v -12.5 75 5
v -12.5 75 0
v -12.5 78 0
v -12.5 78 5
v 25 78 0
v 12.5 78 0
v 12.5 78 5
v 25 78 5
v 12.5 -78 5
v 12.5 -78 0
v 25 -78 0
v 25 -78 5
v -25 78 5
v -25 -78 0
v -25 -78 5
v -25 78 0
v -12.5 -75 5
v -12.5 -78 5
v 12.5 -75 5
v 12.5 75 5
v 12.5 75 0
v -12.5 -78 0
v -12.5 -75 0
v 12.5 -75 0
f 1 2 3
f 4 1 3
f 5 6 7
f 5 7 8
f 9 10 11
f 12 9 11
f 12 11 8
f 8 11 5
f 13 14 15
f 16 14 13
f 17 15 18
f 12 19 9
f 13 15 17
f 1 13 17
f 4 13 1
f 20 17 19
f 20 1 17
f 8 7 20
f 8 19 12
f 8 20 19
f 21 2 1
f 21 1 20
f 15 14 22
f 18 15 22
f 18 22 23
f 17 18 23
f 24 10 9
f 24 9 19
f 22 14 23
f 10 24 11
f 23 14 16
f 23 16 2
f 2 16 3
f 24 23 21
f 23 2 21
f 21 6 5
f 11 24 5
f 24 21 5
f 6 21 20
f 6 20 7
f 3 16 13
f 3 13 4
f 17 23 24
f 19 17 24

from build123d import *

# Parameters (mm, degrees)
SKETCH1_W               = 50
SKETCH1_H               = 156
BOSS_EXTRUDE1_DEPTH     = 5
CUT_EXTRUDE1_DEPTH      = 22.86
CUT_EXTRUDE1_DEPTH_BACK = 20.32
SKETCH2_W               = 25
SKETCH2_H               = 3


with BuildPart() as part:
    # Sketch1 → Boss-Extrude1 (new body)
    with BuildSketch(Plane.XY):
        Rectangle(SKETCH1_W, SKETCH1_H)
    extrude(amount=BOSS_EXTRUDE1_DEPTH)

    # Sketch2 → Cut-Extrude1 (cut, two sides: drawn at the far end of the back side and taken through both)
    with BuildSketch(Plane.XY.offset(5).offset(-CUT_EXTRUDE1_DEPTH_BACK)):
        with Locations((0, 76.5)):
            Rectangle(SKETCH2_W, SKETCH2_H)
        with Locations((0, -76.5)):
            Rectangle(SKETCH2_W, SKETCH2_H)
    extrude(amount=CUT_EXTRUDE1_DEPTH + CUT_EXTRUDE1_DEPTH_BACK, mode=Mode.SUBTRACT)


solid = part.part
